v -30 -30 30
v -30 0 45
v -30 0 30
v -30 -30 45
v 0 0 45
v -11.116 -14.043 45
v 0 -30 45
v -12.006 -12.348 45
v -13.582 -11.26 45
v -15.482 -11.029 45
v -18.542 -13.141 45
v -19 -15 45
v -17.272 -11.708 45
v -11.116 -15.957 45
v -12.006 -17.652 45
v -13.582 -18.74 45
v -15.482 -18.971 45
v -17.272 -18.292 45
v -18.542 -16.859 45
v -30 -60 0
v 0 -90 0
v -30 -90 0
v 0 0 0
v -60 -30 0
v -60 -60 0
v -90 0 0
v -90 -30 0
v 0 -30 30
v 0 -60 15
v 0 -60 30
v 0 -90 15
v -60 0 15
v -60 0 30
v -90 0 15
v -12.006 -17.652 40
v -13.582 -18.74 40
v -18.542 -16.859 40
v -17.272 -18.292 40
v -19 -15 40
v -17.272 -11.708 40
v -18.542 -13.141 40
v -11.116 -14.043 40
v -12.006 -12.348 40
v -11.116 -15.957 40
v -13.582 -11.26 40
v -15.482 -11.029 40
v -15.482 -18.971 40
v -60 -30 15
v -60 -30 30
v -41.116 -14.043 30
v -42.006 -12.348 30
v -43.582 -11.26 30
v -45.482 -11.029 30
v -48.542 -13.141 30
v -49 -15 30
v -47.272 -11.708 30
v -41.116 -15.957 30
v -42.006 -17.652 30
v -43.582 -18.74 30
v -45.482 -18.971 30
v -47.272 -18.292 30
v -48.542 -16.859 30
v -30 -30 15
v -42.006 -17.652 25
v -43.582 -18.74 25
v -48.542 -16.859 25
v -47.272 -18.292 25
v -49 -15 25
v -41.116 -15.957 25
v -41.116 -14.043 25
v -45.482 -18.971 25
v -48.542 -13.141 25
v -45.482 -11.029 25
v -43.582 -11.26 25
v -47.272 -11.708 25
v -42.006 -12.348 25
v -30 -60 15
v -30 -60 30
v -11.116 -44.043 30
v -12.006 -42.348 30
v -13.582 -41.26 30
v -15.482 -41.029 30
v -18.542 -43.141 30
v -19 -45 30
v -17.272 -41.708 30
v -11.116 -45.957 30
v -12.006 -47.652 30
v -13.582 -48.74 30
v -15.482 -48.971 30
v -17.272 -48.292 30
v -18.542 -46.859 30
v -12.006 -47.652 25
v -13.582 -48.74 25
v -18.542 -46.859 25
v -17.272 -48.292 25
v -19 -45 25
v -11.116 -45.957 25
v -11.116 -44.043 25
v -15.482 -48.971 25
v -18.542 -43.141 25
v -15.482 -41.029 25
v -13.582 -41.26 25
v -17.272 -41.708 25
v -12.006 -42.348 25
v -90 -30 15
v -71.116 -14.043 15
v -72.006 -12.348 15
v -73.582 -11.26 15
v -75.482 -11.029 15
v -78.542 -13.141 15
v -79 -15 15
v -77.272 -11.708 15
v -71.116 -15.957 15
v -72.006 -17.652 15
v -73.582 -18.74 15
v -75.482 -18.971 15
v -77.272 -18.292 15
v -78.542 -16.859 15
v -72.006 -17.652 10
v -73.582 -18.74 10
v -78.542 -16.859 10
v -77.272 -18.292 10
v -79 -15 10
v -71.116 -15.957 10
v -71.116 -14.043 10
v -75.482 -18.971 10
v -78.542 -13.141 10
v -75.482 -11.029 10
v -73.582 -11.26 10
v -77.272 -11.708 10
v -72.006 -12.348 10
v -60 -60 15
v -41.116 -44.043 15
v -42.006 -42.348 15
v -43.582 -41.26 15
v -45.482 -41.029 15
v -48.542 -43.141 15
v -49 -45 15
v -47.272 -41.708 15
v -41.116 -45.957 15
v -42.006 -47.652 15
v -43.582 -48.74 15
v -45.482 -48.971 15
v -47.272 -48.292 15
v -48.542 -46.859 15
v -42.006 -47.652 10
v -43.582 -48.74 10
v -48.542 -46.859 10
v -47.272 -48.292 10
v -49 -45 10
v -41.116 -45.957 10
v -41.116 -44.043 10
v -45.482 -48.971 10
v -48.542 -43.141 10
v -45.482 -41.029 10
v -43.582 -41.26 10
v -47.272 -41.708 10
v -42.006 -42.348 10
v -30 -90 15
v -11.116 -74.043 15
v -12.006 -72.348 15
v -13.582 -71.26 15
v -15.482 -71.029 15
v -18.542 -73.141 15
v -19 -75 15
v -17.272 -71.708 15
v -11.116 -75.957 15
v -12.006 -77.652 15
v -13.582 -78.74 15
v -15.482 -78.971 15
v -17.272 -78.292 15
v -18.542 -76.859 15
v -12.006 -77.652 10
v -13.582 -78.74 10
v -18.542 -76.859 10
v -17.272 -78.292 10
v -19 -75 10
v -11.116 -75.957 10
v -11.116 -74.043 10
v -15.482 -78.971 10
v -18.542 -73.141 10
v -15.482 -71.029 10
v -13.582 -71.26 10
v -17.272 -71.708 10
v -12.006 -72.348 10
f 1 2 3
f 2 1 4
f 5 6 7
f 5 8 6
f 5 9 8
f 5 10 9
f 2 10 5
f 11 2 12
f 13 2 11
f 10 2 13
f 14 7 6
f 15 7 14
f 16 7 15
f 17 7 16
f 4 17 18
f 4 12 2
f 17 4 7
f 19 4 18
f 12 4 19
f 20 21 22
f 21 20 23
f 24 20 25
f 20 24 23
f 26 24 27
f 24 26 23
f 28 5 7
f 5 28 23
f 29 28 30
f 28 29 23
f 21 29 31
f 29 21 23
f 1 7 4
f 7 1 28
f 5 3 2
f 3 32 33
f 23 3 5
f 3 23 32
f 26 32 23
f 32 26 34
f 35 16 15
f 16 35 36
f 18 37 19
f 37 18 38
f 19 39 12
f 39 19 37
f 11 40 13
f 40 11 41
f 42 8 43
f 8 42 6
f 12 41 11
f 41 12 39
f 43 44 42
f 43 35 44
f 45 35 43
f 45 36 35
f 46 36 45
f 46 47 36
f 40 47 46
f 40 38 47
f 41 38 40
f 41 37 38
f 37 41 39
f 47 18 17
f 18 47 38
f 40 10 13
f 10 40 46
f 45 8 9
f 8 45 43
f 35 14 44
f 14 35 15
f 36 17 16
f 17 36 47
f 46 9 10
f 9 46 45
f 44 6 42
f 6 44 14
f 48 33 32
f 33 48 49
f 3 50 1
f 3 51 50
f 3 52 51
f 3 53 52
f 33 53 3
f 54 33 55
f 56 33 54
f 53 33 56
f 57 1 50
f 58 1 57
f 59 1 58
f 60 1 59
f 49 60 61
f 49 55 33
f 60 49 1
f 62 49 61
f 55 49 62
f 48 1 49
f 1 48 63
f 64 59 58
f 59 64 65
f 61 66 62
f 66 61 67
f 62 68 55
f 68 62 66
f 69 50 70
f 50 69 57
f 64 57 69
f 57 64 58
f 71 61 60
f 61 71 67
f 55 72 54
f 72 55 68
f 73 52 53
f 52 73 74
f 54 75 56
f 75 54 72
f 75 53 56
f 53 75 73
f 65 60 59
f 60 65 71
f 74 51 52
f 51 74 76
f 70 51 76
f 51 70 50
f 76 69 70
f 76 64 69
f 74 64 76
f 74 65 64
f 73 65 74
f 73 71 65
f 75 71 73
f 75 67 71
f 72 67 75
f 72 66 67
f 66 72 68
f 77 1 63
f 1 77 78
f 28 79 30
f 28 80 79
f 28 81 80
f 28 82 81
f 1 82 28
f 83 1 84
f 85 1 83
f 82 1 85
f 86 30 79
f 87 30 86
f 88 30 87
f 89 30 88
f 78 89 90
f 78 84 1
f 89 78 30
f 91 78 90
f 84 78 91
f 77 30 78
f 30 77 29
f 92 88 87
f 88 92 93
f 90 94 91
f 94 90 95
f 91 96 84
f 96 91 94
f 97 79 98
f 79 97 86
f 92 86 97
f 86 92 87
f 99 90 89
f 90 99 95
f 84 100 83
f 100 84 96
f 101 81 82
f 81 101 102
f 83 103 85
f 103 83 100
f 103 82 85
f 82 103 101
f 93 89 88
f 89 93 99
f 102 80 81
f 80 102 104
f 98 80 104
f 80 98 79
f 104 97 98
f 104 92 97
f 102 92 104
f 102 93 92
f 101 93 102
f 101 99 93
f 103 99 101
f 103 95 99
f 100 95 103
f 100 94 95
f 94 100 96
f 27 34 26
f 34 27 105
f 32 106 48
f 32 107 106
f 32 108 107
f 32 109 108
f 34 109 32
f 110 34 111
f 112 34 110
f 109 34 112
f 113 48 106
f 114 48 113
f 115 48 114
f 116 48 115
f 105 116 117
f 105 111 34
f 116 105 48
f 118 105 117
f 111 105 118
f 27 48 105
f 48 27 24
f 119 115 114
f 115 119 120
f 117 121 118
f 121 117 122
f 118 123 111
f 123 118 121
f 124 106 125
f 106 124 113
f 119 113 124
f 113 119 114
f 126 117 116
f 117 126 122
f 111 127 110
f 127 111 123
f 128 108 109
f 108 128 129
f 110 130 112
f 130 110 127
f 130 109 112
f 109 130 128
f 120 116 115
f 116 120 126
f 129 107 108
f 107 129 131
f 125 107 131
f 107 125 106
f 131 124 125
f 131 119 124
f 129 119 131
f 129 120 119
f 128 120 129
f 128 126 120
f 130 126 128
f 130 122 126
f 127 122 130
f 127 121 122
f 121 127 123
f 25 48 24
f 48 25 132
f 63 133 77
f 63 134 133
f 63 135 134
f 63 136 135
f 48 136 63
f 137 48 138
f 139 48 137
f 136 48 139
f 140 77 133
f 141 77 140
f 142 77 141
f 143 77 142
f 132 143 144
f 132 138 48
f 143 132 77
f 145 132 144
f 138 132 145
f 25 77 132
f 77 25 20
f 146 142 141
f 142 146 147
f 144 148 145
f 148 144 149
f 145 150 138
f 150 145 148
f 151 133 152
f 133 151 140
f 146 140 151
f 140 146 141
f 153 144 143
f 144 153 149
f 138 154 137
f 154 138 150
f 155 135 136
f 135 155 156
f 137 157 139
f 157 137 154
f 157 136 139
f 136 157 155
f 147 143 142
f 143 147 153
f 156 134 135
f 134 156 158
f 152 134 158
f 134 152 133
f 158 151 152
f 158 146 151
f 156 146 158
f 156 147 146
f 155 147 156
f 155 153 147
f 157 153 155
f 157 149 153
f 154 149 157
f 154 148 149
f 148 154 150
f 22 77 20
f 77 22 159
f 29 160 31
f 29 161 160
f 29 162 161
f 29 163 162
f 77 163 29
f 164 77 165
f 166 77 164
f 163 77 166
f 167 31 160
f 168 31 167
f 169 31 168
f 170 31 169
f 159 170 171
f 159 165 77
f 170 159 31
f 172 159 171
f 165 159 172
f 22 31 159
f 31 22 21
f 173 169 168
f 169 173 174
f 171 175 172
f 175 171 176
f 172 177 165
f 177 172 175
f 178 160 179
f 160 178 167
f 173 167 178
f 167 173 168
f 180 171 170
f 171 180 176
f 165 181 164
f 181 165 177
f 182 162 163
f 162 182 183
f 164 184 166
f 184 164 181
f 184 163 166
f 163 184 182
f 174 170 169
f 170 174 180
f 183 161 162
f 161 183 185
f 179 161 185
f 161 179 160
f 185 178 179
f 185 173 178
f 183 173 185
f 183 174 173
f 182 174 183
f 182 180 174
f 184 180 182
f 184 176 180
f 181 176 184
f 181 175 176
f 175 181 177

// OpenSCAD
n = 3;

holeDiameter = 8;
holeDepth = 5;
boxLength = 30;
boxHeightFactor = .5;

module makeBox (boxHeight) {
    difference() {
        cube([boxLength,boxLength,boxHeight]);
        translate([boxLength*.5,boxLength*.5,boxHeight])
        cylinder(h=holeDepth*2,d=holeDiameter,center=true);
    }
}

rotate(180,0,0)
for (i=[0:n-1]) {
    for (j=[0:i]) {
        translate([(i-j)*boxLength,(j)*boxLength,0])
        makeBox((n-i)*boxLength*boxHeightFactor);
    }
}
